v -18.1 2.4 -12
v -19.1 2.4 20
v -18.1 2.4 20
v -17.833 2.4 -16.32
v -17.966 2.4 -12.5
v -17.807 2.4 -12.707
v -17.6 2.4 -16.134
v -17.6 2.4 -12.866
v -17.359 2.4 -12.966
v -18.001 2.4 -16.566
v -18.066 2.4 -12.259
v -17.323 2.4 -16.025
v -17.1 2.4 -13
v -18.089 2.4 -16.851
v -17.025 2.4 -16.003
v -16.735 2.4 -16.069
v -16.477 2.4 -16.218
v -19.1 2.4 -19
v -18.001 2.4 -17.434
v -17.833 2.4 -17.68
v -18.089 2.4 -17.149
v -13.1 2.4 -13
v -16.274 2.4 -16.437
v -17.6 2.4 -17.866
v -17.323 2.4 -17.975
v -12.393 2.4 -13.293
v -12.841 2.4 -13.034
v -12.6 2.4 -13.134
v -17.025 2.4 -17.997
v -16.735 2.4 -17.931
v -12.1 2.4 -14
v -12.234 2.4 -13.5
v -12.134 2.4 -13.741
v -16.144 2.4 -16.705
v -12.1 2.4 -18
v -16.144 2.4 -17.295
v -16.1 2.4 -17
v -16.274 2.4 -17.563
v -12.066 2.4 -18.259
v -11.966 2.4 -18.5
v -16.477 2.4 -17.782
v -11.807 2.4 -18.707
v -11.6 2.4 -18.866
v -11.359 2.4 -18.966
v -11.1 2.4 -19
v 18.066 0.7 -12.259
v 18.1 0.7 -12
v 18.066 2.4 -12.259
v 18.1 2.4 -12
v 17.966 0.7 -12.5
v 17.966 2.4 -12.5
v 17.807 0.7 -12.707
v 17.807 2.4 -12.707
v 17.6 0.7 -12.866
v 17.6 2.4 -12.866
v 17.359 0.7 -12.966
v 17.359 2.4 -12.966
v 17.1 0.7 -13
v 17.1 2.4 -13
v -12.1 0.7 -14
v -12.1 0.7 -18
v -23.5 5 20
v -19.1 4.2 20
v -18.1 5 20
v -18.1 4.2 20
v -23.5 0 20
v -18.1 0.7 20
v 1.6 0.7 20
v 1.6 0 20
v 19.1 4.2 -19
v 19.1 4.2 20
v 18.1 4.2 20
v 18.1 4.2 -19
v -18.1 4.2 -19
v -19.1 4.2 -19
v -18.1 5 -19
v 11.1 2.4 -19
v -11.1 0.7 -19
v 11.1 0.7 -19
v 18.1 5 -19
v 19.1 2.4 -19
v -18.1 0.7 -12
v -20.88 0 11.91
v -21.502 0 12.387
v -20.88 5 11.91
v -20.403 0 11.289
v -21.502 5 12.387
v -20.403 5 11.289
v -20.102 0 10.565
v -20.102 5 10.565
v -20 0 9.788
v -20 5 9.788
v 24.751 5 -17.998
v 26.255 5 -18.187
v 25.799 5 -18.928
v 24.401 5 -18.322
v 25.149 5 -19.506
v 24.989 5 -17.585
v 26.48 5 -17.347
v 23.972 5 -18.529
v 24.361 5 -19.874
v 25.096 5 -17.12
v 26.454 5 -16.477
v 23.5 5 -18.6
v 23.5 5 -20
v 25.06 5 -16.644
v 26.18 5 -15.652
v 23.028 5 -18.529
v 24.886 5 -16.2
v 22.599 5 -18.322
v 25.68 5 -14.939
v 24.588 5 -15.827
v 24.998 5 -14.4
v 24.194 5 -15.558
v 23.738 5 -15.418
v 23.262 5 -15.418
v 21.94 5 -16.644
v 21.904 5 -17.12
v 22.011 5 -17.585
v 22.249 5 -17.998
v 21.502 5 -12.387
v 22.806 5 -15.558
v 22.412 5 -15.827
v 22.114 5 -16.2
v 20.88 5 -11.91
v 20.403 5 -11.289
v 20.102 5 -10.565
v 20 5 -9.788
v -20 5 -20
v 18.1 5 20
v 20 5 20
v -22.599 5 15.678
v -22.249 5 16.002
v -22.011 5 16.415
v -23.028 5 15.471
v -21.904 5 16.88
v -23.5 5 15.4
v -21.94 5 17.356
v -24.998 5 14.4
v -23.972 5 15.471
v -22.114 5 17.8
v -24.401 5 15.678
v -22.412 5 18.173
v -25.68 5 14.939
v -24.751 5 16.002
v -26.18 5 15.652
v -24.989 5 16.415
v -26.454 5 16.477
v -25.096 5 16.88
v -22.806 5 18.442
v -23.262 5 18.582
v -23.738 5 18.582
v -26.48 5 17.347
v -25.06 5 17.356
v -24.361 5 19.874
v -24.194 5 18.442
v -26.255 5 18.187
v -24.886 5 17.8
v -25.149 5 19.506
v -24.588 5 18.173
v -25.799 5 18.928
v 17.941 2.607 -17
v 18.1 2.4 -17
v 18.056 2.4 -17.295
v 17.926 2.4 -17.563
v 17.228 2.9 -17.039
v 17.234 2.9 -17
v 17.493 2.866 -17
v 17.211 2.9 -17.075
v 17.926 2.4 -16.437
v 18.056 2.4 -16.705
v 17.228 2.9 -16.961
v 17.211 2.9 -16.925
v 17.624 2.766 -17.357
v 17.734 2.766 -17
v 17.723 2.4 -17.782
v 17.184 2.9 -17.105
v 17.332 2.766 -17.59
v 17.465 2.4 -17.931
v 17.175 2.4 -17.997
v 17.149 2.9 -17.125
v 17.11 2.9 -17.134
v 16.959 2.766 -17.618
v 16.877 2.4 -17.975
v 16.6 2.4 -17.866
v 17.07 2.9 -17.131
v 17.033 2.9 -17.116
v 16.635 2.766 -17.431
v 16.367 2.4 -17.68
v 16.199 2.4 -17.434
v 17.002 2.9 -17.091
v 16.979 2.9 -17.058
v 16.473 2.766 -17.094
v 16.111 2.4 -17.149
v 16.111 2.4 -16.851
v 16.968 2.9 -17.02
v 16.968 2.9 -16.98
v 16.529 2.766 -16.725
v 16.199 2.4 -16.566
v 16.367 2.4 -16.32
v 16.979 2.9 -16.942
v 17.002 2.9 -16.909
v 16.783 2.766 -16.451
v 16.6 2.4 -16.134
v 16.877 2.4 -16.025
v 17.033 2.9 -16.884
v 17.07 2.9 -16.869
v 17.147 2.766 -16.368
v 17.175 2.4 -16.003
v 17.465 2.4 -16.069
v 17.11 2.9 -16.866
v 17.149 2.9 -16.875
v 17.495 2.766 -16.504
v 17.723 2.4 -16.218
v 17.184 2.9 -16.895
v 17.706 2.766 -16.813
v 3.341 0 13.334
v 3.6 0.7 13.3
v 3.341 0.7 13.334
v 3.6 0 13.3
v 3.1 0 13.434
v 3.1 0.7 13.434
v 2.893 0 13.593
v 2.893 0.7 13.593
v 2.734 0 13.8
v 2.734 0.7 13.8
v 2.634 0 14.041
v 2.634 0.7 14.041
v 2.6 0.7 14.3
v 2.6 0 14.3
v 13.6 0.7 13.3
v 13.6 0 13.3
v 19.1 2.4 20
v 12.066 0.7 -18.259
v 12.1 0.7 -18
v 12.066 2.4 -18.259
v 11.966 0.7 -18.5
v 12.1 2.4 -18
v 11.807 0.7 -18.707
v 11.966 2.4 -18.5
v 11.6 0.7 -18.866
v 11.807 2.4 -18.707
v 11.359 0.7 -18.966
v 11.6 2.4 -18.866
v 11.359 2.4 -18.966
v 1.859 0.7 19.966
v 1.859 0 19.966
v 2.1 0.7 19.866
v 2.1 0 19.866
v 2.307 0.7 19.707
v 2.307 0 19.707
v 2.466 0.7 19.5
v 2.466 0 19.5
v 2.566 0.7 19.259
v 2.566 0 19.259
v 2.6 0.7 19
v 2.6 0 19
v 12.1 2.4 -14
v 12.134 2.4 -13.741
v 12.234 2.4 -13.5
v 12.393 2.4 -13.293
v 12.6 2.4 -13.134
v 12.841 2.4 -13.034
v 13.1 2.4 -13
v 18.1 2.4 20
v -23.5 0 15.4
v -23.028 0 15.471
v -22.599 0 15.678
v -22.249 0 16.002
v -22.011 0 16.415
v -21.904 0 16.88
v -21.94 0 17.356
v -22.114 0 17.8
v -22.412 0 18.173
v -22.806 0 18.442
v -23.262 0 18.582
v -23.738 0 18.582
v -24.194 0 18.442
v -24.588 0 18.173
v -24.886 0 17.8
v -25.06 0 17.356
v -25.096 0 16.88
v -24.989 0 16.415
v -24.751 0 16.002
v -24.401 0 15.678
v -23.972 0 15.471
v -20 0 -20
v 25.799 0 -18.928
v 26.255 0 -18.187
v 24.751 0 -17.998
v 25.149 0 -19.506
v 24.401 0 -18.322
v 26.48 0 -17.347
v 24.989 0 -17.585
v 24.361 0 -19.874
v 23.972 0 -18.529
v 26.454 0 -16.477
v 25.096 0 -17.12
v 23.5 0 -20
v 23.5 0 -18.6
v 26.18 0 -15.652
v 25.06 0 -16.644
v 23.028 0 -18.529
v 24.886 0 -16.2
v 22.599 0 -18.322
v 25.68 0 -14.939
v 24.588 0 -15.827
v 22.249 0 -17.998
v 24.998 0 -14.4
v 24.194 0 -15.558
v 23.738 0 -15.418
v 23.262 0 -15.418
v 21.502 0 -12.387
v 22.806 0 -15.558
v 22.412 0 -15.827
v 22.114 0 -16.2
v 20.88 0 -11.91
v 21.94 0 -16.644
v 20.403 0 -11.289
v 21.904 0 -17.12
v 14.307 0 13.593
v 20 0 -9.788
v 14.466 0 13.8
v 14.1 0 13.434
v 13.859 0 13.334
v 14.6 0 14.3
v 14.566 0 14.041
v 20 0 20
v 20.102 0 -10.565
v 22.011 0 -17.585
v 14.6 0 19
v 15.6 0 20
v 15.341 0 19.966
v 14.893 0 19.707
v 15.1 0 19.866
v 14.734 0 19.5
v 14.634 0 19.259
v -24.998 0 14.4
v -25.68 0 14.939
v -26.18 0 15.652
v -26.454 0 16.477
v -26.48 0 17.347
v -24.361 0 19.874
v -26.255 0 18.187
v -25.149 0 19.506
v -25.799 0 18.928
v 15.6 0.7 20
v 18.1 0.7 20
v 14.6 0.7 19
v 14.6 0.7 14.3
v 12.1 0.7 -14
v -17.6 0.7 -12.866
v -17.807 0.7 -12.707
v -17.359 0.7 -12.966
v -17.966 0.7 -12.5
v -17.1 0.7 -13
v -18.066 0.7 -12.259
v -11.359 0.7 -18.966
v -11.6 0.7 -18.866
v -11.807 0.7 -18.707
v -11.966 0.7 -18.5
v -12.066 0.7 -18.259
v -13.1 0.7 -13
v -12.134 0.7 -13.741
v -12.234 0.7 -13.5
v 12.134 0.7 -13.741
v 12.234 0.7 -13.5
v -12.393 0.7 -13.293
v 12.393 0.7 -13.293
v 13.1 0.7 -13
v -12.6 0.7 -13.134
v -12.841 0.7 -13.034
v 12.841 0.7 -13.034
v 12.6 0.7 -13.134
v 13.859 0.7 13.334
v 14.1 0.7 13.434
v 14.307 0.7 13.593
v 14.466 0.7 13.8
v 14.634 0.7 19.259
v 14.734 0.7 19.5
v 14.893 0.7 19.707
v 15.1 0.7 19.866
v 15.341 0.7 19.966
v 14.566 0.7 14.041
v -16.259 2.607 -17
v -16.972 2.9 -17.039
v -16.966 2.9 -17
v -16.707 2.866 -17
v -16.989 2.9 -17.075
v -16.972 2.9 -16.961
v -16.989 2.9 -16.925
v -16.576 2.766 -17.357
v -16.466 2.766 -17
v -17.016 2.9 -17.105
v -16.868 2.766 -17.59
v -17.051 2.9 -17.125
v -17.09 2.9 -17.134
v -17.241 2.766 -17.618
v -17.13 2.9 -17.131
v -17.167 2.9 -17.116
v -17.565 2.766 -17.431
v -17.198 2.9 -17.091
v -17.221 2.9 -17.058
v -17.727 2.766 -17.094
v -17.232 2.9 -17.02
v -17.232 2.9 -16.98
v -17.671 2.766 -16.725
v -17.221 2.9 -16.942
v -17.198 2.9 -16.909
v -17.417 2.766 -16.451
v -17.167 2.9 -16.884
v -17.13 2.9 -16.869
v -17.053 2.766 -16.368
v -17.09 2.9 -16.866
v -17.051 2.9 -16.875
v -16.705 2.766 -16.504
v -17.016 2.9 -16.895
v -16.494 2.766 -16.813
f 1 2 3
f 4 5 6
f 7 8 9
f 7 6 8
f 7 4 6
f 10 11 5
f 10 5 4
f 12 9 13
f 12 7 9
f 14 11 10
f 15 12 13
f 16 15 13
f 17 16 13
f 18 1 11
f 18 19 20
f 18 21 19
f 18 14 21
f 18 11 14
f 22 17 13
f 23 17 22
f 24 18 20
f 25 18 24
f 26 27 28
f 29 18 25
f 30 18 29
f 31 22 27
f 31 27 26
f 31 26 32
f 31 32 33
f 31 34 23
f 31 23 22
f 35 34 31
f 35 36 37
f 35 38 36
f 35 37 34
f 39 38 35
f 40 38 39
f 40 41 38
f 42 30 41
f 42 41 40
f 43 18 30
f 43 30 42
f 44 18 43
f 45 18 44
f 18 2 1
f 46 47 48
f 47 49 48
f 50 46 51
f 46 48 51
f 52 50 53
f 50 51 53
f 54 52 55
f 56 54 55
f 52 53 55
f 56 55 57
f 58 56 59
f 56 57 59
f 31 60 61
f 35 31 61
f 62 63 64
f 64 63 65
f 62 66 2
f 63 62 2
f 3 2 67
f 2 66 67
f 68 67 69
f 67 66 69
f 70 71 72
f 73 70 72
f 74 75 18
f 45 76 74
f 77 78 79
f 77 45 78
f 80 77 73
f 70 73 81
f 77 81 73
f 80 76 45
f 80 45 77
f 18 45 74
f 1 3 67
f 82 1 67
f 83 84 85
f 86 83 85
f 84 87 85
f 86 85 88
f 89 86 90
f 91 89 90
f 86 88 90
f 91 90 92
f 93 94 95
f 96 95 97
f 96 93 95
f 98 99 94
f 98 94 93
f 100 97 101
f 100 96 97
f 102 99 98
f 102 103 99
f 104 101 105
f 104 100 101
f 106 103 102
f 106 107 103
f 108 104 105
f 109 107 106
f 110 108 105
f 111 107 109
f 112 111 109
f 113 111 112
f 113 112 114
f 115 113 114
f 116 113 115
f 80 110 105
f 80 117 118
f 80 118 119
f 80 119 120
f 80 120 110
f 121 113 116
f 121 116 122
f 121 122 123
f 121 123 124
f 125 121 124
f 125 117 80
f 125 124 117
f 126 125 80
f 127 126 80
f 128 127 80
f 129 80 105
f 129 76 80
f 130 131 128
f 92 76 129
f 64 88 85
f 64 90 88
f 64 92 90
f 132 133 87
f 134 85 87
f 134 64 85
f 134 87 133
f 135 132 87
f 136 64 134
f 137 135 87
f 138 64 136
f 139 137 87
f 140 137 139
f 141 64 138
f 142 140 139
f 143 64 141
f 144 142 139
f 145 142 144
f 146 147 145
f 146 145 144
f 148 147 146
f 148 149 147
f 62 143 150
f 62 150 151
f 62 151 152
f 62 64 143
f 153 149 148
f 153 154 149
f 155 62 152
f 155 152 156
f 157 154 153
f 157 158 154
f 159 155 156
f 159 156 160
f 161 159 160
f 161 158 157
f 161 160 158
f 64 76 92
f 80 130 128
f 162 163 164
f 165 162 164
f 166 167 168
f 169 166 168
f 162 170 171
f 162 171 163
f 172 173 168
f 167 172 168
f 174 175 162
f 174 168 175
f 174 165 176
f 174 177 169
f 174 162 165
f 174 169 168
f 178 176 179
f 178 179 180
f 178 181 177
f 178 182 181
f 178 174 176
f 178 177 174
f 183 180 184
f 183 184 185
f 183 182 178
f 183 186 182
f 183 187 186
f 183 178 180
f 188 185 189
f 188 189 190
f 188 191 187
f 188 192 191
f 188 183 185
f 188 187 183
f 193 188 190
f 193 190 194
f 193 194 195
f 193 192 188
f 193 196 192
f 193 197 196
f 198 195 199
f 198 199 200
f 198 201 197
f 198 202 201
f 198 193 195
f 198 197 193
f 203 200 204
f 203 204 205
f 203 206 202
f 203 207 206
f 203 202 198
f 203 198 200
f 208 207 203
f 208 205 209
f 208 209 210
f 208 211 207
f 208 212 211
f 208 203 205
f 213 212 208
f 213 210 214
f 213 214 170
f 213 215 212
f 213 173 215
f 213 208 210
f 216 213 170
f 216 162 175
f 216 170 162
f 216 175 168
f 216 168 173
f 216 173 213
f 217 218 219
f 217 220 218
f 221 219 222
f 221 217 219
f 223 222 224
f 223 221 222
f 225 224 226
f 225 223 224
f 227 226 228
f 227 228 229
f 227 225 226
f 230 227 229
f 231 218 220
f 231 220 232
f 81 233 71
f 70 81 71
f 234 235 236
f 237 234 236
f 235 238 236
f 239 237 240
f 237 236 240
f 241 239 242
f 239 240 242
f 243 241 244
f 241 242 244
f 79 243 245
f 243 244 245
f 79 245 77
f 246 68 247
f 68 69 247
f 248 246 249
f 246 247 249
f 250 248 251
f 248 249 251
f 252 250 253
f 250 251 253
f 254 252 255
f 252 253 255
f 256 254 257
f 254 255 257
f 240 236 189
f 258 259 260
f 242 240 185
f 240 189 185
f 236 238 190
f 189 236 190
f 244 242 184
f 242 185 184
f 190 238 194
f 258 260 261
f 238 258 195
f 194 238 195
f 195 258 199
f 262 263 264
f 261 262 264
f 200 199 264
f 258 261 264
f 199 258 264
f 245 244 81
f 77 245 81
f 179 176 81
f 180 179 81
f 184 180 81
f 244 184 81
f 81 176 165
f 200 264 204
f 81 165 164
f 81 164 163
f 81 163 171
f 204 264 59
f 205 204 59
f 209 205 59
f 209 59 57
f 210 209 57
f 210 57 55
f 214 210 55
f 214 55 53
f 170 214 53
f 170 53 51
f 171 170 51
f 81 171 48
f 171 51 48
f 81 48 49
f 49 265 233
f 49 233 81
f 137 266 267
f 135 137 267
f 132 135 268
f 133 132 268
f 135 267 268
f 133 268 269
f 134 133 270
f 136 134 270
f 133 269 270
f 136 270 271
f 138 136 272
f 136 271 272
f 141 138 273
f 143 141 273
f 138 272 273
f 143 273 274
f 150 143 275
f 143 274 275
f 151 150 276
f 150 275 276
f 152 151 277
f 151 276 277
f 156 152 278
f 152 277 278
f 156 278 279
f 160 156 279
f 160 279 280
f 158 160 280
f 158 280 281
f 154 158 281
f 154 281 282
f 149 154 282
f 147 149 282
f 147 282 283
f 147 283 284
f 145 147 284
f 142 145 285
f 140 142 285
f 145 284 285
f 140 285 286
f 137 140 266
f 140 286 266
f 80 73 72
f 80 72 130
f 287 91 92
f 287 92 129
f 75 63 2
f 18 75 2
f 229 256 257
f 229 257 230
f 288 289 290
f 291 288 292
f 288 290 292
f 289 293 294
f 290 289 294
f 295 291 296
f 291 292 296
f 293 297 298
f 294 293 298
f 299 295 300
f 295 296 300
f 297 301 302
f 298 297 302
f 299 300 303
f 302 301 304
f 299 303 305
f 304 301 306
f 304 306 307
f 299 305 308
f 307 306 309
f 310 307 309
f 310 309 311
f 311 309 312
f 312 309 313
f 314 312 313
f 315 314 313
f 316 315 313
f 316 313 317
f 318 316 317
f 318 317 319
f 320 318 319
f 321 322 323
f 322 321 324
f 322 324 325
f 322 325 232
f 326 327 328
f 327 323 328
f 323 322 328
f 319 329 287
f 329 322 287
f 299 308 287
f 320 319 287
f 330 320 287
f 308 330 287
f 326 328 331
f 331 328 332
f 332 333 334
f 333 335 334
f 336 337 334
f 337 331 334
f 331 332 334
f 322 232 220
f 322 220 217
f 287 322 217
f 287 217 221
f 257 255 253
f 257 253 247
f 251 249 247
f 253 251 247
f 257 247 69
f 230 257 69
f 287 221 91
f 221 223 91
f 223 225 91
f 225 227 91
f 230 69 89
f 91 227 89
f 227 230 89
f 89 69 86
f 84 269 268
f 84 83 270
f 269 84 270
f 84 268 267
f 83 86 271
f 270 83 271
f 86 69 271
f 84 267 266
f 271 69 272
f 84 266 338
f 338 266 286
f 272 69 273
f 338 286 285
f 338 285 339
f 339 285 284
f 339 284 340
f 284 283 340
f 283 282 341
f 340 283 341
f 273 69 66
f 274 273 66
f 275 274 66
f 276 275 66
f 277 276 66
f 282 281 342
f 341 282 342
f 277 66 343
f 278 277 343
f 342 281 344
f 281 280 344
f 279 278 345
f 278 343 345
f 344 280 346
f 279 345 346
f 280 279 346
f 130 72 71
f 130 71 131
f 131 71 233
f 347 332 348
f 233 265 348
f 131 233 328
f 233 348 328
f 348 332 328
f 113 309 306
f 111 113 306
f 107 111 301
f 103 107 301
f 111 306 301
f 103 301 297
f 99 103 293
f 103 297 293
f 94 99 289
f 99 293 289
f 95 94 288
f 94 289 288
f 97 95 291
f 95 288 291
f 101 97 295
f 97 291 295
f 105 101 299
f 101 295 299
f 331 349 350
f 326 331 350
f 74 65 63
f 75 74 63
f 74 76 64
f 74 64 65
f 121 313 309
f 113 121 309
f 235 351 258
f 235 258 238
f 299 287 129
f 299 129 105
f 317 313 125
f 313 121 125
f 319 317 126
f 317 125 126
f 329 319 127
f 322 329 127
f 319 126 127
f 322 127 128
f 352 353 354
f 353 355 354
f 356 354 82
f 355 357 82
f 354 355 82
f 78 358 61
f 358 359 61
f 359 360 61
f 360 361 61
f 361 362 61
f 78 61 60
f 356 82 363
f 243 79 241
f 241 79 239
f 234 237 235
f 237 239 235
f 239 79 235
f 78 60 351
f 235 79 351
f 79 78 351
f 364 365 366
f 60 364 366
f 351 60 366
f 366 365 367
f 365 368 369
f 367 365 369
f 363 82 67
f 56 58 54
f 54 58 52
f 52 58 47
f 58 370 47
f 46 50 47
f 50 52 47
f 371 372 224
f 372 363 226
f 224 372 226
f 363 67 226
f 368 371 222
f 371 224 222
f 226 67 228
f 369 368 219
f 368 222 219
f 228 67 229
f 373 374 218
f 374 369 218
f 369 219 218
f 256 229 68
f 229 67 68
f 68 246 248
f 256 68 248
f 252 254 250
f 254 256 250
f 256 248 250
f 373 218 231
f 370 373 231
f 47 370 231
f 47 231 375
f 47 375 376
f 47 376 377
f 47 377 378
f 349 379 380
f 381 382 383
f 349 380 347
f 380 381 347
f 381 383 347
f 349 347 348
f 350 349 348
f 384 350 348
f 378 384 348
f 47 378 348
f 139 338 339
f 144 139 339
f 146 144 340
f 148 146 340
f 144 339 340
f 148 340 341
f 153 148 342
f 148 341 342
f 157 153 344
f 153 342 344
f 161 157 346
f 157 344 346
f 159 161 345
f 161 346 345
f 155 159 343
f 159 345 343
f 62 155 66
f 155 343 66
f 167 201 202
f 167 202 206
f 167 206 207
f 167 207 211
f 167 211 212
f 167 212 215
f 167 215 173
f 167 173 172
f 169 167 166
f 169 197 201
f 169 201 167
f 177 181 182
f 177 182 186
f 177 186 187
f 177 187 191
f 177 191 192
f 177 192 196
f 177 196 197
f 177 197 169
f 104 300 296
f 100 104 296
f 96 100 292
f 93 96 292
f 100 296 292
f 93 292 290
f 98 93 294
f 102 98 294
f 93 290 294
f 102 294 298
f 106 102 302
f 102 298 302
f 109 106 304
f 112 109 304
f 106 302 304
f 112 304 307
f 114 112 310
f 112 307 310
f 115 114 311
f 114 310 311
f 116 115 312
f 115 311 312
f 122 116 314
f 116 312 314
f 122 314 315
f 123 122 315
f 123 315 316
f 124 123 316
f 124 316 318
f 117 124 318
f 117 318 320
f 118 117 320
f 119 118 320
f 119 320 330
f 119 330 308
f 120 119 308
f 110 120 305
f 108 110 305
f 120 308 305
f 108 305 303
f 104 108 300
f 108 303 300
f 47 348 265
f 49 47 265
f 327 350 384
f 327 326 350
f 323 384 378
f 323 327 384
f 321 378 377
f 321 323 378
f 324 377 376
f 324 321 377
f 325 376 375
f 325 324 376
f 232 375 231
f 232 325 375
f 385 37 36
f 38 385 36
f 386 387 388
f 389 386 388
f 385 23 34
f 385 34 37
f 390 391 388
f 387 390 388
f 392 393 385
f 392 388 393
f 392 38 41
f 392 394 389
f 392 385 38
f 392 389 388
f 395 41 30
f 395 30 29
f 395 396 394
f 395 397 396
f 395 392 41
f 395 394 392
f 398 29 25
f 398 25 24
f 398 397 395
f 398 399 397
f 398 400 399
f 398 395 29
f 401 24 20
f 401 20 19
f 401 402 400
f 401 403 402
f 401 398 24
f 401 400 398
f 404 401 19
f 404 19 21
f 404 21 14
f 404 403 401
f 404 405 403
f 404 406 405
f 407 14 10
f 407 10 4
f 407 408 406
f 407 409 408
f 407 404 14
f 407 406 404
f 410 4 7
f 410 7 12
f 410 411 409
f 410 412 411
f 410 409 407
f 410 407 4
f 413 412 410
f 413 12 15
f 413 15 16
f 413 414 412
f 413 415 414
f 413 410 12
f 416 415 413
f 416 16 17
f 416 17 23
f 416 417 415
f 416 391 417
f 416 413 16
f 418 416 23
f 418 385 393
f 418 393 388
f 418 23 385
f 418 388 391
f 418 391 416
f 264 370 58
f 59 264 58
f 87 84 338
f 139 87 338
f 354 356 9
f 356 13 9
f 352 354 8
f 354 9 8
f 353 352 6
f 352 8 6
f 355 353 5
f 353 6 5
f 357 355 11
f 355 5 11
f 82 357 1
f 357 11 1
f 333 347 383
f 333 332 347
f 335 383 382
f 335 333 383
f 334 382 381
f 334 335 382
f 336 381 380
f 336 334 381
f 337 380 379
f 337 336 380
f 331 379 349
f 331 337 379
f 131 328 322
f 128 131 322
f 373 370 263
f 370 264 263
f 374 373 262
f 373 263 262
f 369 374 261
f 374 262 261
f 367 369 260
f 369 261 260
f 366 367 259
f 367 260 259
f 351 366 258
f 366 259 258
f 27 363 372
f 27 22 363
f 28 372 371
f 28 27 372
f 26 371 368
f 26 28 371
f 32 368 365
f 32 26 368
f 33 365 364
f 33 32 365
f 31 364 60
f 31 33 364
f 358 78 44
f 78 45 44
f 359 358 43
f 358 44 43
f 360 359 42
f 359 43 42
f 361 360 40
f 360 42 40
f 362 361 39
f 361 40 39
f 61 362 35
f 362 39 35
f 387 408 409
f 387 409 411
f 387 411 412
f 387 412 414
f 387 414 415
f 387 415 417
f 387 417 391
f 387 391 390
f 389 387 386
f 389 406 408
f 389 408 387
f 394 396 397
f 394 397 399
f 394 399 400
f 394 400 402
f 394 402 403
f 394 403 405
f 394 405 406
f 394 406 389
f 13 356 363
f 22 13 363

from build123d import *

# Parameters (mm, degrees)
SKETCH1_W           = 40
SKETCH1_H           = 40
BOSS_EXTRUDE1_DEPTH = 5
CUT_EXTRUDE2_DEPTH  = 39
SKETCH4_W           = 12
SKETCH4_H           = 6.7
CUT_EXTRUDE3_DEPTH  = 29.609264234
SKETCH5_W           = 6
SKETCH5_H           = 6
BOSS_EXTRUDE2_DEPTH = 1.7
FILLET1_R           = 1
SKETCH6_R           = 1
BOSS_EXTRUDE3_DEPTH = 0.5
FILLET2_R           = 1
SKETCH7_R           = 1.6
BOSS_EXTRUDE4_DEPTH = 5
FILLET3_R           = 3


with BuildPart() as part:
    # Sketch1 → Boss-Extrude1 (new body)
    with BuildSketch(Plane(origin=(0, 0, 0), x_dir=(1, 0, 0), z_dir=(0, 1, 0))):
        Rectangle(SKETCH1_W, SKETCH1_H)
    extrude(amount=BOSS_EXTRUDE1_DEPTH)

    # Sketch3 → Cut-Extrude2 (cut)
    with BuildSketch(Plane.XY.offset(20)):
        Polygon((-18.1, 5), (-18.1, 4.2), (-19.1, 4.2), (-19.1, 2.4), (-18.1, 2.4), (-18.1, 0.7), (18.1, 0.7), (18.1, 2.4), (19.1, 2.4), (19.1, 4.2), (18.1, 4.2), (18.1, 5), align=None)
    extrude(amount=-CUT_EXTRUDE2_DEPTH, mode=Mode.SUBTRACT)

    # Sketch4 → Cut-Extrude3 (cut, through all)
    with BuildSketch(Plane(origin=(0, 0.7, 0), x_dir=(1, 0, 0), z_dir=(0, 1, 0))):
        with Locations((8.6, -16.65)):
            Rectangle(SKETCH4_W, SKETCH4_H)
    extrude(amount=-CUT_EXTRUDE3_DEPTH, mode=Mode.SUBTRACT)

    # Sketch5 → Boss-Extrude2 (add)
    with BuildSketch(Plane(origin=(0, 0.7, 0), x_dir=(1, 0, 0), z_dir=(0, 1, 0))):
        with Locations((-15.1, 16)):
            Rectangle(SKETCH5_W, SKETCH5_H)
        with Locations((15.1, 16)):
            Rectangle(SKETCH5_W, SKETCH5_H)
    extrude(amount=BOSS_EXTRUDE2_DEPTH)

    # Fillet1
    fillet1_edges = [part.edges().sort_by_distance(p)[0] for p in [
        (2.6, 0.35, 20),
        (2.6, 0.35, 13.3),
        (14.6, 0.35, 13.3),
        (14.6, 0.35, 20),
        (-18.1, 1.55, -13),
        (-12.1, 1.55, -13),
        (-12.1, 1.55, -19),
        (18.1, 1.55, -13),
        (12.1, 1.55, -19),
        (12.1, 1.55, -13),
    ]]
    fillet(fillet1_edges, radius=FILLET1_R)

    # Sketch6 → Boss-Extrude3 (add)
    with BuildSketch(Plane(origin=(0, 2.4, 0), x_dir=(1, 0, 0), z_dir=(0, 1, 0))):
        with Locations((-17.1, 17)):
            Circle(SKETCH6_R)
        with Locations((17.1, 17)):
            Circle(SKETCH6_R)
    extrude(amount=BOSS_EXTRUDE3_DEPTH)

    # Fillet2
    # the kernel refuses this fillet: 1 mm, written as the material it takes off along each edge
    with BuildSketch(Plane(origin=(-17.1, 2.9, -17), x_dir=(1, 0, 0), z_dir=(0, 0, 1))) as fillet2_piece_1:
        with BuildLine():
            CenterArc((0.133974596, -1), FILLET2_R, 30, 60)
            Line((0.133974596, 0), (0.133974596, 0.02))
            Line((0.133974596, 0.02), (1, 0.02))
            Line((1, 0.02), (1.02, 0))
            ThreePointArc((1.02, 0), (1.02, -0.25), (1.017320508, -0.49))
            Line((1.017320508, -0.49), (1, -0.5))
        make_face()
    revolve(axis=Axis((-17.1, 2.9, -17), (0, 1, 0)), mode=Mode.SUBTRACT)
    with BuildSketch(Plane(origin=(17.1, 2.9, -17), x_dir=(1, 0, 0), z_dir=(0, 0, 1))) as fillet2_piece_2:
        with BuildLine():
            CenterArc((0.133974596, -1), FILLET2_R, 30, 60)
            Line((0.133974596, 0), (0.133974596, 0.02))
            Line((0.133974596, 0.02), (1, 0.02))
            Line((1, 0.02), (1.02, 0))
            ThreePointArc((1.02, 0), (1.02, -0.25), (1.017320508, -0.49))
            Line((1.017320508, -0.49), (1, -0.5))
        make_face()
    revolve(axis=Axis((17.1, 2.9, -17), (0, 1, 0)), mode=Mode.SUBTRACT)

    # Sketch7 → Boss-Extrude4 (add)
    # profile 1 of 2: a face of its own
    with BuildSketch(Plane.XZ):
        with BuildLine():
            Line((-20, 20), (-20, 11.521537766))
            Line((-20, 11.521537766), (-24.997516692, 14.400491632))
            ThreePointArc((-24.997516692, 14.400491632), (-26.398148125, 17.775072543), (-23.5, 20))
            Line((-23.5, 20), (-20, 20))
        make_face()
        with Locations(Location((-23.5, 17, 0), (0, 0, 270))):
            Circle(SKETCH7_R, mode=Mode.SUBTRACT)
    # profile 2 of 2: a face of its own
    with BuildSketch(Plane.XZ):
        with BuildLine():
            Line((20, -20), (20, -11.521537766))
            Line((20, -11.521537766), (24.997516692, -14.400491632))
            ThreePointArc((24.997516692, -14.400491632), (26.398148125, -17.775072543), (23.5, -20))
            Line((23.5, -20), (20, -20))
        make_face()
        with Locations(Location((23.5, -17, 0), (0, 0, 270))):
            Circle(SKETCH7_R, mode=Mode.SUBTRACT)
    extrude(amount=-BOSS_EXTRUDE4_DEPTH)

    # Fillet3
    fillet3_edges = [part.edges().sort_by_distance(p)[0] for p in [
        (-20, 2.5, 11.521537766),
        (20, 2.5, -11.521537766),
    ]]
    fillet(fillet3_edges, radius=FILLET3_R)


solid = part.part
